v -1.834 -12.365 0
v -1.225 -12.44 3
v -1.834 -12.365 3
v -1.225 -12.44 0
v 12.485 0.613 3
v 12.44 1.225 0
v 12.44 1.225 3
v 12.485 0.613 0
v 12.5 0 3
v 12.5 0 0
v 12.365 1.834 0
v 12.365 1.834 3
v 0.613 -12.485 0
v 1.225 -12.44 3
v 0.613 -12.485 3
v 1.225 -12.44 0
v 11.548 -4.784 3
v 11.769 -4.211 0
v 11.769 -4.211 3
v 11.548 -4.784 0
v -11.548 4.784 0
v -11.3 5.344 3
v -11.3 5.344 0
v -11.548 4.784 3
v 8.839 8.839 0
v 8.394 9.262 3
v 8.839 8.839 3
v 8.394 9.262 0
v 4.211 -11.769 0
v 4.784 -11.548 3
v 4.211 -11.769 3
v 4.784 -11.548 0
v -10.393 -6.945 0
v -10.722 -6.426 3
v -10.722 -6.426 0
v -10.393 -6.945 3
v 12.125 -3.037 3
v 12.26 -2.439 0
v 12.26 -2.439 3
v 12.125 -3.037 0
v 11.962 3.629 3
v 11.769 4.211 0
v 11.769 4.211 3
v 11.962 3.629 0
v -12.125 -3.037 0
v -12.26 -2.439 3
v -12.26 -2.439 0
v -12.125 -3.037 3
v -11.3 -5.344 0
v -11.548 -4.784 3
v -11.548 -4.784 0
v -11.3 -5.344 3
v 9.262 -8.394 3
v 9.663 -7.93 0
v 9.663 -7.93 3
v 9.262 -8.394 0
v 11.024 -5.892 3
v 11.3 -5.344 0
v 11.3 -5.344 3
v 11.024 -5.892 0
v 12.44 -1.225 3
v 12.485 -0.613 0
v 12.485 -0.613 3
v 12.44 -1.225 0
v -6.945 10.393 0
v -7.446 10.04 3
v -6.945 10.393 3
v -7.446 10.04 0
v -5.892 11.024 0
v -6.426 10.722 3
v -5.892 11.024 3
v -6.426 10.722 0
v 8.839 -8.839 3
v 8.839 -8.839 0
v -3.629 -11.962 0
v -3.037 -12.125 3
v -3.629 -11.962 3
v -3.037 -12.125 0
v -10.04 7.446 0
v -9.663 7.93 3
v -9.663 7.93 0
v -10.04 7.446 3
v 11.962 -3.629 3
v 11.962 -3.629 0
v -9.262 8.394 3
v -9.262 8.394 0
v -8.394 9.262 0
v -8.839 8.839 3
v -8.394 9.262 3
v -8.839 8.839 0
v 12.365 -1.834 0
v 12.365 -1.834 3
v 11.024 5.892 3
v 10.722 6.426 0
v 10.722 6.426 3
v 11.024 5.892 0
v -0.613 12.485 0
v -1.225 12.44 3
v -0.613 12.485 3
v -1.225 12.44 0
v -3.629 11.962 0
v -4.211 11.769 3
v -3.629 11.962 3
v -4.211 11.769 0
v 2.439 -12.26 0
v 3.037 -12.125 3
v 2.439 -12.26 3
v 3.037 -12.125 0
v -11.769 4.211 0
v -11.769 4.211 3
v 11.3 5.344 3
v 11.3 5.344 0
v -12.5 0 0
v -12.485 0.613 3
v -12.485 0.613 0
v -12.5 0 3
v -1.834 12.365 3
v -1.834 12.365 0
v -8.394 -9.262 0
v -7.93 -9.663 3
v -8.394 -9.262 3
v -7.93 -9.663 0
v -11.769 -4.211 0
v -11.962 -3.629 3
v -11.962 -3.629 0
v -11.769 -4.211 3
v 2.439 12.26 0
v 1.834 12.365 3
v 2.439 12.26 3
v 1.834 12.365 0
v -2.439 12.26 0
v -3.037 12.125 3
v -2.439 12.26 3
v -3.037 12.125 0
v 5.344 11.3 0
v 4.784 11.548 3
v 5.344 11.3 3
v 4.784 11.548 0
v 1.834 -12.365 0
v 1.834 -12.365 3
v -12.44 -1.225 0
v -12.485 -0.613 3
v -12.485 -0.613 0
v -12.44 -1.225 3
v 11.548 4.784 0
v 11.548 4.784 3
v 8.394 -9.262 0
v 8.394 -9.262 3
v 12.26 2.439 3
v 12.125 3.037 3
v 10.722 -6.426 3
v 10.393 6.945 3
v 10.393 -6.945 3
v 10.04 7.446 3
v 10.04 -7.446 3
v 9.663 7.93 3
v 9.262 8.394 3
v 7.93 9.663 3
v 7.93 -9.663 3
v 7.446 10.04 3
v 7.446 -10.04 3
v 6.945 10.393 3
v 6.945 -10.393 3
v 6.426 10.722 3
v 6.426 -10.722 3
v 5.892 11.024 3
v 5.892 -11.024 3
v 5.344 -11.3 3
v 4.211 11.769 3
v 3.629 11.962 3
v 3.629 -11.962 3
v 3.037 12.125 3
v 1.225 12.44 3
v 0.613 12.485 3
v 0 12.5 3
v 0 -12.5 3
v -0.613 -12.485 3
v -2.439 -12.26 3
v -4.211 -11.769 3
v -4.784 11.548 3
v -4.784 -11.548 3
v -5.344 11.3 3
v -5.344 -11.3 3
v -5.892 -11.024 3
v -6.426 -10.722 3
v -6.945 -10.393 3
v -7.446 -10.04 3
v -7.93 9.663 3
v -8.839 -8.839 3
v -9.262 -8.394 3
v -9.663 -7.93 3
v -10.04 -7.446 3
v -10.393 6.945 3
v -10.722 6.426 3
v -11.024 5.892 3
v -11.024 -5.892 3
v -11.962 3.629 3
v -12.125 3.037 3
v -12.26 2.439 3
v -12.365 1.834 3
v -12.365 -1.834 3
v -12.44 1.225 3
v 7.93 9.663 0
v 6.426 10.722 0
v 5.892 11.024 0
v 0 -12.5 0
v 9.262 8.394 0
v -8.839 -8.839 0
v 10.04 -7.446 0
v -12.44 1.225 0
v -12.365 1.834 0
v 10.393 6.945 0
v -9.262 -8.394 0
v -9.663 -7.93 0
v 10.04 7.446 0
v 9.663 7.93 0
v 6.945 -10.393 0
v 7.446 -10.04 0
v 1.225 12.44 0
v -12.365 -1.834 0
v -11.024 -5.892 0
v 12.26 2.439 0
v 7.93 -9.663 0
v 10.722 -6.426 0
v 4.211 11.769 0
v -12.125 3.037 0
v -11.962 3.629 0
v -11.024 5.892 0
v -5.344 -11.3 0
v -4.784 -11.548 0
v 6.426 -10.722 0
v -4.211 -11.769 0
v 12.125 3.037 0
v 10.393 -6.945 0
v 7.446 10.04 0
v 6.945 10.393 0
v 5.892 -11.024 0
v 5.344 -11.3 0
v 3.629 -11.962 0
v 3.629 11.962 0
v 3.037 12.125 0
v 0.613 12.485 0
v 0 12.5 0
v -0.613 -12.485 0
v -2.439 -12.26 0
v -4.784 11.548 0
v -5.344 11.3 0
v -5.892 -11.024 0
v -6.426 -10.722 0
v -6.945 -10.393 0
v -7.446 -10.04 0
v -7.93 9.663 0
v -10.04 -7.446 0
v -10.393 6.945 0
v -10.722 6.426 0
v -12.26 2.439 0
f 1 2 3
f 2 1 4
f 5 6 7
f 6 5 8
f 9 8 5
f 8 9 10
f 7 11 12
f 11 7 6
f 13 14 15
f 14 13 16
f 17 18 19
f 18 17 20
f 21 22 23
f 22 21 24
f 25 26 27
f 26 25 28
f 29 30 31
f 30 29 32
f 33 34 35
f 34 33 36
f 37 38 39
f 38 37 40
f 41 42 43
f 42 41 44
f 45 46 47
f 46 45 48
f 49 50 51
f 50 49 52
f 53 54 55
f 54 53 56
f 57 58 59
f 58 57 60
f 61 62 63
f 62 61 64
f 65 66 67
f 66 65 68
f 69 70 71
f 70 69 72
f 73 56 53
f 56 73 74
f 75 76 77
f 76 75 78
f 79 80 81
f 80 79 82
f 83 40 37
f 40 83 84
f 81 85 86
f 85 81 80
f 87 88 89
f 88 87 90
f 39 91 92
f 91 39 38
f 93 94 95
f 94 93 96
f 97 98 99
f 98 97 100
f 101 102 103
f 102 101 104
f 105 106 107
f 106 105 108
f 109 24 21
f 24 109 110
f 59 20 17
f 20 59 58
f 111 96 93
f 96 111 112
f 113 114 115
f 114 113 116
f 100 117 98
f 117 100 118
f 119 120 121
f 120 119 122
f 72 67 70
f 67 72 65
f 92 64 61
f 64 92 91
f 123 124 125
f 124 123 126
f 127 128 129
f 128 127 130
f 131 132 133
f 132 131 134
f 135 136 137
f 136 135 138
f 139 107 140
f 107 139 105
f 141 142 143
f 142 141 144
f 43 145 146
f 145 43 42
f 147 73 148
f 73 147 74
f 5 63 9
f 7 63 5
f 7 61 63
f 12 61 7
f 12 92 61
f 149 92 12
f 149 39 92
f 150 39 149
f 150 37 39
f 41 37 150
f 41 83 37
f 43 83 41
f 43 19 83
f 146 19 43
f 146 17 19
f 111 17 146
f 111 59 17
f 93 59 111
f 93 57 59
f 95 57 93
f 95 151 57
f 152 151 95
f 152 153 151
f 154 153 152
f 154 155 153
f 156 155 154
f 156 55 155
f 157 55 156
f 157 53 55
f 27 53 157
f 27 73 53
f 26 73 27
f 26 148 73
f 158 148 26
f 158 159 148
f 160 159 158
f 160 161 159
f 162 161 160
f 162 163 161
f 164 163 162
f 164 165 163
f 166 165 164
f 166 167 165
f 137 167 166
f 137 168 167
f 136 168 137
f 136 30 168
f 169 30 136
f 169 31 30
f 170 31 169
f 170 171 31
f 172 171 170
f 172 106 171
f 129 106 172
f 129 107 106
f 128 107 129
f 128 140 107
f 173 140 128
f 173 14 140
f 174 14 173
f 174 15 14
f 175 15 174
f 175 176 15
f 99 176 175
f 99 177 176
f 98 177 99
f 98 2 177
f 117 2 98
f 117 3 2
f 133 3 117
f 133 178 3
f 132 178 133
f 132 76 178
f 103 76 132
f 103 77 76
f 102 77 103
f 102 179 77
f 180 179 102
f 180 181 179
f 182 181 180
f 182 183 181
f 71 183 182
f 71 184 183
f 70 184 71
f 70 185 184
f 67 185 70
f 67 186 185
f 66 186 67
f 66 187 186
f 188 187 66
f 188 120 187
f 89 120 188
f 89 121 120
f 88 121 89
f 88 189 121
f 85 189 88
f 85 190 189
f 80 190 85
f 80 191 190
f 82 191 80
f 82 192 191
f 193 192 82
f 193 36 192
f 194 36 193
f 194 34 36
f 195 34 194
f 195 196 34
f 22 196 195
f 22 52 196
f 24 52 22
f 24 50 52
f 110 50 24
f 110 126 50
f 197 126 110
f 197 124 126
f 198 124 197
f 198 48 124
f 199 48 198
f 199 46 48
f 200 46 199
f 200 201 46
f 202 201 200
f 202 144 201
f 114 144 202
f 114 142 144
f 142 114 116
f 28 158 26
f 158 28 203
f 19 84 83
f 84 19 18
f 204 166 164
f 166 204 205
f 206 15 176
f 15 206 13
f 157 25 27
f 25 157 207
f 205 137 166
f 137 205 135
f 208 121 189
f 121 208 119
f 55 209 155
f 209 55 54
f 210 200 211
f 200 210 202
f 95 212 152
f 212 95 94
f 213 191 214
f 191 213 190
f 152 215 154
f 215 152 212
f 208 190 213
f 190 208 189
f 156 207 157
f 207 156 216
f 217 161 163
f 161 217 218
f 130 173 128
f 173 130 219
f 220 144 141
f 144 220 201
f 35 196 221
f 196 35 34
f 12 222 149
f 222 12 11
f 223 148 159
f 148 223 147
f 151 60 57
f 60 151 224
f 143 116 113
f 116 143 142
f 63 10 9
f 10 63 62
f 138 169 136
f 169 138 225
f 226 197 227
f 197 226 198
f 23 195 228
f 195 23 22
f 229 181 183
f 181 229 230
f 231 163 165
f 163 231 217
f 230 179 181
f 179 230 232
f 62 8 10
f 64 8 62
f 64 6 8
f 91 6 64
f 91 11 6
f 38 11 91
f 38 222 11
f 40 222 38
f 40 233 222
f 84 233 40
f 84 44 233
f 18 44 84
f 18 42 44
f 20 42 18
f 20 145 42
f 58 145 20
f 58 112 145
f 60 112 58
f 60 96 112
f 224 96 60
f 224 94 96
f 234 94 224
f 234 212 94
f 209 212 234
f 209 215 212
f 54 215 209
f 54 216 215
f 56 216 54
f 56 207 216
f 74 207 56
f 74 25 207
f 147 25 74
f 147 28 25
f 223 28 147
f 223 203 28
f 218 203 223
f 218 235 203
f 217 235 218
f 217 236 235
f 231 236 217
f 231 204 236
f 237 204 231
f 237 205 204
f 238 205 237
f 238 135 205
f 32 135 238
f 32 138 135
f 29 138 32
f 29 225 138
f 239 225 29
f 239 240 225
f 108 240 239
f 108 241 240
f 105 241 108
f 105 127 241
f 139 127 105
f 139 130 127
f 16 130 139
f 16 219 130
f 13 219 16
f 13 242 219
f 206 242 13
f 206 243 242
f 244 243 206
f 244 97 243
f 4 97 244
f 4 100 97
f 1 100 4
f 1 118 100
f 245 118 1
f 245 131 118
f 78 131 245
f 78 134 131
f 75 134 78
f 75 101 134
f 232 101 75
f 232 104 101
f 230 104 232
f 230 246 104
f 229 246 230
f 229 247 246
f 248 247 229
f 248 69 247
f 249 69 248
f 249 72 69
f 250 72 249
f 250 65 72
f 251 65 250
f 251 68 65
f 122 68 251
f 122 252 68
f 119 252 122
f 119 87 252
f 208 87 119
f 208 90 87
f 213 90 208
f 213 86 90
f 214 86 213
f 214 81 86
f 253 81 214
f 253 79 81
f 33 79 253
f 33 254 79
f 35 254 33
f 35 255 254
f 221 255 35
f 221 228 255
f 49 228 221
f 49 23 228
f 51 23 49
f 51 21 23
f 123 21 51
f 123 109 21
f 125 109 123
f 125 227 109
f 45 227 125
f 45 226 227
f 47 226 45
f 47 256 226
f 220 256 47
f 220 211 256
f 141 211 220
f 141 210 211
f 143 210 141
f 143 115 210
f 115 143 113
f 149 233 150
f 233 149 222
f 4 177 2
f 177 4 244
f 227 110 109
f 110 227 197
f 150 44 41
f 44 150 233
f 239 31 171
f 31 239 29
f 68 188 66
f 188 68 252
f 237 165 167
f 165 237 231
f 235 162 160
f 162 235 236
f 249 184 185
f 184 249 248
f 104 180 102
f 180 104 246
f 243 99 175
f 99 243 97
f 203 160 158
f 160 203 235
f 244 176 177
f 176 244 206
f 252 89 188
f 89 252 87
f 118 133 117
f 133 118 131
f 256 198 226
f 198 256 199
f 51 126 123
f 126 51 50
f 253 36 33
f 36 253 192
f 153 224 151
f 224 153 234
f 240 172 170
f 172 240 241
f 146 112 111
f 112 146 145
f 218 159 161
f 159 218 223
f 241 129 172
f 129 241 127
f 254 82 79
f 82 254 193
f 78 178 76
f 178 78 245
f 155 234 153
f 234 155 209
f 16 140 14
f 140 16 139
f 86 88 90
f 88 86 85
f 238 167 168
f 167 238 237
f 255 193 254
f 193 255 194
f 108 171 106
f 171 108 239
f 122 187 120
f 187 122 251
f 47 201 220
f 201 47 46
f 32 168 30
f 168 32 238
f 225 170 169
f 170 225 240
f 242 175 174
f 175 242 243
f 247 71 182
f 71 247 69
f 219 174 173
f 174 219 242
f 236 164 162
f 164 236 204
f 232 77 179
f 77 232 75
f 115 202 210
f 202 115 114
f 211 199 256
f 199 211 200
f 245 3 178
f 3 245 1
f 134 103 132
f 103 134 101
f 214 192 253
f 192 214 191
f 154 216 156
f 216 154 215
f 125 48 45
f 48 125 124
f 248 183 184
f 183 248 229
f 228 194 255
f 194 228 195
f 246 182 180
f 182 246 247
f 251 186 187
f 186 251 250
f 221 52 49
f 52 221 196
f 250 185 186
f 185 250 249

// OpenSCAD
// Generic Game Coin Generator
// Features: Custom image bitmaps for heads/tails, edge options (rim, reeds, or text)
// Units: mm

$fn = 128;

// ============================================
// COIN PARAMETERS
// ============================================

// Basic dimensions
coin_diameter = 25;
coin_height = 3;
face_depth = 3;  // Maximum depth of bitmap relief

// Edge configuration: "rim", "reeds", or "text"
edge_type = "text";  // Options: "rim", "reeds", "text"

// Rim configuration (used when edge_type = "rim")
rim_width = 1.5;
rim_height = 0.3;

// Reeds configuration (used when edge_type = "reeds")
num_reeds = 120;
reed_depth = 0.3;
reed_width = 0.5;

// Edge text configuration (used when edge_type = "text")
edge_text = "GAME COIN";
edge_text_size = 2;
edge_text_depth = 0.3;
edge_text_vertical = false;  // true for vertical text around edge

// ============================================
// IMAGE BITMAP PARAMETERS
// ============================================

// Image file paths (PNG, JPG, or other formats supported by OpenSCAD)
// Images should be at least 512x512 pixels for good resolution
heads_image = "heads.png";  // Replace with your image file path
tails_image = "tails.png";  // Replace with your image file path

// Image dimensions (in pixels) - adjust to match your actual images
image_width = 512;
image_height = 512;

// ============================================
// MODULES
// ============================================

// Main coin module
module game_coin() {
    difference() {
        union() {
            // Base coin body
            cylinder(d = coin_diameter, h = coin_height);
            
            // Add edge detail based on type
            if (edge_type == "rim") {
                add_rim();
            } else if (edge_type == "reeds") {
                add_reeds();
            }
            // Text edge is handled in difference()
            // Add faces (heads and tails) using image bitmaps
            add_heads_face();
            add_tails_face();
        }
        
        // Add edge text if specified
        if (edge_type == "text") {
            add_edge_text();
        }
        
    }
}

// Add raised rim to edge
module add_rim() {
    translate([0, 0, coin_height - rim_height])
        difference() {
            cylinder(d = coin_diameter, h = rim_height);
            cylinder(d = coin_diameter - rim_width * 2, h = rim_height + 0.01);
        }
}

// Add reeds (grooves) to edge
module add_reeds() {
    reed_angle = 360 / num_reeds;
    for (i = [0:num_reeds-1]) {
        rotate([0, 0, i * reed_angle])
            translate([coin_diameter / 2 - reed_depth, 0, 0])
                cube([reed_depth * 2, reed_width, coin_height], center = true);
    }
}

// Add text around the edge
module add_edge_text() {
    text_radius = coin_diameter / 2 - edge_text_depth / 2;
    text_length = len(edge_text);
    angle_per_char = 360 / text_length;
    
    for (i = [0:text_length - 1]) {
        rotate([90, 0, i * angle_per_char])
            translate([0, text_radius, coin_height / 2])
                rotate([0, 0, 90])
                    linear_extrude(height = edge_text_depth + 0.1, center = true)
                        text(
                            edge_text[i],
                            size = edge_text_size,
                            halign = "center",
                            valign = "center",
                            font = "Arial:style=Bold"
                        );
    }
}

// Add image-based face relief
module image_face(image_file, is_top = true) {
    // Calculate the inscribed square size
    // For a circle of diameter D, the inscribed square has side D
    square_size = coin_diameter;
    
    // Scale factor to fit image onto the inscribed square
    scale_xy = square_size / image_width;
    
    // Height scale: 255 (max greyscale) maps to face_depth
    scale_z = face_depth / 255;
    
    z_offset = is_top ? coin_height : 0;
    z_direction = is_top ? 1 : -1;
    
    translate([0, 0, z_offset])
        scale([scale_xy, scale_xy, scale_z])
            // Rotate 180 degrees for bottom face so it appears correctly
            rotate([is_top ? 0 : 180, 0, 0])
                //translate([0, 0, is_top ? 0 : -255])
                    intersection() {
                        // Load the image as a surface
                        surface(
                            file = image_file,
                            center = true,
                            convexity = 255
                        );
                        
                        // Mask to circular coin shape
                        translate([0, 0, -128])
                            cylinder(
                                d = image_width,
                                h = 255,
                                center = false
                            );
                    }
}

// Add heads face (top)
module add_heads_face() {
    color("lightgray")
        image_face(heads_image, is_top = true);
}

// Add tails face (bottom)
module add_tails_face() {
    color("lightgray")
        image_face(tails_image, is_top = false);
}

// ============================================
// RENDER
// ============================================

game_coin();
